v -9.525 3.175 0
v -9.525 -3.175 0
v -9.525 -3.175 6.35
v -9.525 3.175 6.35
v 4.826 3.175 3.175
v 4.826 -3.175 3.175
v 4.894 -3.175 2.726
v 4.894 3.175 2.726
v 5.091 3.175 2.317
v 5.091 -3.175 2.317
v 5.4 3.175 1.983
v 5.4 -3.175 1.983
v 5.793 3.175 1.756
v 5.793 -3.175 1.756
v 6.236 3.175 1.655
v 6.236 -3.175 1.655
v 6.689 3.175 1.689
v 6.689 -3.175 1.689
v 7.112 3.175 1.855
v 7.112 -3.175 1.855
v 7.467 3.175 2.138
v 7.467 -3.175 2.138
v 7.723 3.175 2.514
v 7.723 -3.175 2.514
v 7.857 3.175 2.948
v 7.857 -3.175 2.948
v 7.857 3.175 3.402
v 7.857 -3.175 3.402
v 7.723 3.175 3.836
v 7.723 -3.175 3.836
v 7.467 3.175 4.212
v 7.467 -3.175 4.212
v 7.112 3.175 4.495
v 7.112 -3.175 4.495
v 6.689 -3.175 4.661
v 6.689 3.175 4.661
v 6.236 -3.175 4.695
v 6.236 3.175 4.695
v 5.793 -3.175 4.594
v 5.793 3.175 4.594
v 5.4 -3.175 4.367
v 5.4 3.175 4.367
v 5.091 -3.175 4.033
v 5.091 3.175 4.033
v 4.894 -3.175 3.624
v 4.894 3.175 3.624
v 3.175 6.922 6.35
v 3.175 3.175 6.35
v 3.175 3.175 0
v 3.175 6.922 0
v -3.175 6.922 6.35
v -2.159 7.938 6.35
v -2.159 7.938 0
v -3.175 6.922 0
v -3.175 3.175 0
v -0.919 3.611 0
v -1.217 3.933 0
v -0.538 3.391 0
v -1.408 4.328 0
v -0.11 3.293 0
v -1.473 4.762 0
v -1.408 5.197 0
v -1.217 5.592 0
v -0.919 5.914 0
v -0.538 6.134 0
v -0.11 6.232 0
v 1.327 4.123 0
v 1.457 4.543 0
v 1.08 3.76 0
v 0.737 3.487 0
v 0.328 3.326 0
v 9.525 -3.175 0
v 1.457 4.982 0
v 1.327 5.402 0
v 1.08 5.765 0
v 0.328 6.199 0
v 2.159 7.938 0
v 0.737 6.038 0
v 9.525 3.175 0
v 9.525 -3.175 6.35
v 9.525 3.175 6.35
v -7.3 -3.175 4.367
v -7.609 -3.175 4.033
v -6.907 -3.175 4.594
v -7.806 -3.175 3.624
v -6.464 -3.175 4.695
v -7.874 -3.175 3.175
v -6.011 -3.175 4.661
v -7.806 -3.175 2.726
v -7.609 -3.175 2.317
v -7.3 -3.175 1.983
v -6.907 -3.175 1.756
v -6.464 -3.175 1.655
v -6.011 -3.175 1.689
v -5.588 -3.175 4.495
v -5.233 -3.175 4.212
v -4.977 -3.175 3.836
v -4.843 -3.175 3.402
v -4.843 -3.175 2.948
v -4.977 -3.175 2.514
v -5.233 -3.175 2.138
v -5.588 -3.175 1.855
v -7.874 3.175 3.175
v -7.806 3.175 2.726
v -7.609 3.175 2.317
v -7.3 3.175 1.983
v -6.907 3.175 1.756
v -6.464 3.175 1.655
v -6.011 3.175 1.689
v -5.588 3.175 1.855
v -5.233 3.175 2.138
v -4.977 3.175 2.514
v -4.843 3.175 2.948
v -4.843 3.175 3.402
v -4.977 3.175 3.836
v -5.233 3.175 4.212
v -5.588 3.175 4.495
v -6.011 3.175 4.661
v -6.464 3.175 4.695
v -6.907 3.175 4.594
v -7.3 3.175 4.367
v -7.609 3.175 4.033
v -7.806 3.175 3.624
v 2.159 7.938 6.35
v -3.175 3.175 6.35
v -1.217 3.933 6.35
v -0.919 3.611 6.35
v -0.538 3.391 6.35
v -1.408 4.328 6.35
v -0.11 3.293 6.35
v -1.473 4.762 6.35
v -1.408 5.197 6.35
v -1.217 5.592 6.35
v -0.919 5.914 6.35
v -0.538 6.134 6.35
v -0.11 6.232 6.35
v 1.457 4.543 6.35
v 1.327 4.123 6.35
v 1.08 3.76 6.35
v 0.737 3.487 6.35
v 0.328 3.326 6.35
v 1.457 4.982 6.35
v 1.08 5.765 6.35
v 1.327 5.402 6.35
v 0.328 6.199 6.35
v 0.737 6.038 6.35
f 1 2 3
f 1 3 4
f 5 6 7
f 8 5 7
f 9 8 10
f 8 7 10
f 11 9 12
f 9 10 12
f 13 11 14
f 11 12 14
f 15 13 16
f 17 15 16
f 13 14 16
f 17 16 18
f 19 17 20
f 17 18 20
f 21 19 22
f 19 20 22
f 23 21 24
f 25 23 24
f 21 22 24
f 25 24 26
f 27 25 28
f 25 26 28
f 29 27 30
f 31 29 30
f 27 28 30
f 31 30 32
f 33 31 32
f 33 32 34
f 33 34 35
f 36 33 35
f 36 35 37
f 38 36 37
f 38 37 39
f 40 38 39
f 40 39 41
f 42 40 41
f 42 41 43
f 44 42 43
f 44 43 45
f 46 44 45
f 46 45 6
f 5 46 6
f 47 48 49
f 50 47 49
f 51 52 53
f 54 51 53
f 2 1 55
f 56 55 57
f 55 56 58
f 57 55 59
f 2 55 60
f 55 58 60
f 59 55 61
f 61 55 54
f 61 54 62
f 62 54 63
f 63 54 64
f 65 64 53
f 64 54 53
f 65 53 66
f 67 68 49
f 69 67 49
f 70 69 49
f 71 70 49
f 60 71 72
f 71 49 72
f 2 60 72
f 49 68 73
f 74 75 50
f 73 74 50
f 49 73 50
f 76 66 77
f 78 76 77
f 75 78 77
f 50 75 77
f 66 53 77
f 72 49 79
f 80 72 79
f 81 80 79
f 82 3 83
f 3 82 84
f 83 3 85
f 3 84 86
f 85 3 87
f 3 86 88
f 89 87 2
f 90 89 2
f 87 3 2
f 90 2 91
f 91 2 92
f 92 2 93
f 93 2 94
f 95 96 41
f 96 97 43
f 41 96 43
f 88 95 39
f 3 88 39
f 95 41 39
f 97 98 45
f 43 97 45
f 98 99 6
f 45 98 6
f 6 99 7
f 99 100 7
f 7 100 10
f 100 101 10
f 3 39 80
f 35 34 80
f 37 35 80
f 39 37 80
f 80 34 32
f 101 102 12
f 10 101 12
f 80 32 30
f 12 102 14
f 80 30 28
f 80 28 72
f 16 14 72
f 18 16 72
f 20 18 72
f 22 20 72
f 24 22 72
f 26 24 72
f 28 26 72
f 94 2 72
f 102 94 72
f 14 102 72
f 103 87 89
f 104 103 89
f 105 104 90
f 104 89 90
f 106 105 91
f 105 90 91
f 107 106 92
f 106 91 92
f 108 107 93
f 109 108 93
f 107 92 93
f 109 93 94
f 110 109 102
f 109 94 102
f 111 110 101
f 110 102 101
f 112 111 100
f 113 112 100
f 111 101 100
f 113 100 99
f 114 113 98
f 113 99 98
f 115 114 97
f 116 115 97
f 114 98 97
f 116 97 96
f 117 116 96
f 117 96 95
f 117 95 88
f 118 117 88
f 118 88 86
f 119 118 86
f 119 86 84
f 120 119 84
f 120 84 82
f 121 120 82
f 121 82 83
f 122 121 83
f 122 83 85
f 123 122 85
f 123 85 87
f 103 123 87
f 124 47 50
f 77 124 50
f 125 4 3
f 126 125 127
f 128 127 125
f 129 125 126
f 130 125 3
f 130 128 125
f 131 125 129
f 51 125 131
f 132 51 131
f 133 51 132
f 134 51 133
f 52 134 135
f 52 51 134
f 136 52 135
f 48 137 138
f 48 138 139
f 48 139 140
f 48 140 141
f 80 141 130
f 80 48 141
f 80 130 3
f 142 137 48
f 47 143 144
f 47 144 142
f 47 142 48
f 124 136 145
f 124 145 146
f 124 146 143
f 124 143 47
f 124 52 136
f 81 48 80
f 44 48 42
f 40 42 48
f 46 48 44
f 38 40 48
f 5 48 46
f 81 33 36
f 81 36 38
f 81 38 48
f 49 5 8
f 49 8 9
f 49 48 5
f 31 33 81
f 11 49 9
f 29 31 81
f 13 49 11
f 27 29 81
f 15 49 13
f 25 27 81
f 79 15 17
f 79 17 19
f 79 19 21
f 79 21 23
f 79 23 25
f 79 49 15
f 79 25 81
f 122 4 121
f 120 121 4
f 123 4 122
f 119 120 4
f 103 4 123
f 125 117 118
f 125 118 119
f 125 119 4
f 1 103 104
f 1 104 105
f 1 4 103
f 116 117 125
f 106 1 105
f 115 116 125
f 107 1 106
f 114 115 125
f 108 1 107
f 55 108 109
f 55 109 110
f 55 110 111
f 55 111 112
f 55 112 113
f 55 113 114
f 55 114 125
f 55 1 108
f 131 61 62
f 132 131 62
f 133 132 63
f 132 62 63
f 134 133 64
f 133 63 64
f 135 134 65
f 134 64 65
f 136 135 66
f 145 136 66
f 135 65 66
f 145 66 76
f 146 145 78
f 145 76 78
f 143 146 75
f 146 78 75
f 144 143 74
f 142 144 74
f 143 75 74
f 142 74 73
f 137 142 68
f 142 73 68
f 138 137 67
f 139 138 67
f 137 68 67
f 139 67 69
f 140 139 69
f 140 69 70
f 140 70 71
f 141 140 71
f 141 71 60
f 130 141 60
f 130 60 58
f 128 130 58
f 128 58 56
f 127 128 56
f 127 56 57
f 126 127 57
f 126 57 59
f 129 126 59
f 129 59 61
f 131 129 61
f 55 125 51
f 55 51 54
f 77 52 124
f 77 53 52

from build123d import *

# Parameters (mm, degrees)
SKETCH1_W                        = 19.05
SKETCH1_H                        = 6.35
BOSS_EXTRUDE1_DEPTH              = 6.35
SKETCH6_W                        = 6.35
SKETCH6_H                        = 6.35
BOSS_EXTRUDE2_DEPTH              = 4.7625
TAPPED_HOLE_FOR_4_40_HELICOIL1_D = 3.048
F_4_CLEARANCE_HOLE1_D            = 2.9464
DISTINGUISHINGMARK_SIZE          = 1.016


with BuildPart() as part:
    # Sketch1 → Boss-Extrude1 (new body)
    with BuildSketch(Plane.XY):
        Rectangle(SKETCH1_W, SKETCH1_H)
    extrude(amount=BOSS_EXTRUDE1_DEPTH)

    # Sketch6 → Boss-Extrude2 (add)
    with BuildSketch(Plane(origin=(0, 3.175, 0), x_dir=(1, 0, 0), z_dir=(0, 1, 0))):
        with Locations((0, -3.175)):
            Rectangle(SKETCH6_W, SKETCH6_H)
    extrude(amount=BOSS_EXTRUDE2_DEPTH)

    # Tapped Hole for #4-40 Helicoil1 (through all)
    with Locations(Plane(origin=(0, 3.175, 0), x_dir=(1, 0, 0), z_dir=(0, 1, 0))):
        with Locations((-6.35, -3.175), (6.35, -3.175)):
            Hole(TAPPED_HOLE_FOR_4_40_HELICOIL1_D / 2)

    # #4 Clearance Hole1 (through all)
    with Locations(Plane.XY.offset(6.35)):
        with Locations((0, 4.7625)):
            Hole(F_4_CLEARANCE_HOLE1_D / 2)

    # distinguishingMark
    distinguishingmark_edges = [part.edges().sort_by_distance(p)[0] for p in [
        (3.175, 7.9375, 3.175),
        (-3.175, 7.9375, 3.175),
    ]]
    chamfer(distinguishingmark_edges, length=DISTINGUISHINGMARK_SIZE)


solid = part.part
